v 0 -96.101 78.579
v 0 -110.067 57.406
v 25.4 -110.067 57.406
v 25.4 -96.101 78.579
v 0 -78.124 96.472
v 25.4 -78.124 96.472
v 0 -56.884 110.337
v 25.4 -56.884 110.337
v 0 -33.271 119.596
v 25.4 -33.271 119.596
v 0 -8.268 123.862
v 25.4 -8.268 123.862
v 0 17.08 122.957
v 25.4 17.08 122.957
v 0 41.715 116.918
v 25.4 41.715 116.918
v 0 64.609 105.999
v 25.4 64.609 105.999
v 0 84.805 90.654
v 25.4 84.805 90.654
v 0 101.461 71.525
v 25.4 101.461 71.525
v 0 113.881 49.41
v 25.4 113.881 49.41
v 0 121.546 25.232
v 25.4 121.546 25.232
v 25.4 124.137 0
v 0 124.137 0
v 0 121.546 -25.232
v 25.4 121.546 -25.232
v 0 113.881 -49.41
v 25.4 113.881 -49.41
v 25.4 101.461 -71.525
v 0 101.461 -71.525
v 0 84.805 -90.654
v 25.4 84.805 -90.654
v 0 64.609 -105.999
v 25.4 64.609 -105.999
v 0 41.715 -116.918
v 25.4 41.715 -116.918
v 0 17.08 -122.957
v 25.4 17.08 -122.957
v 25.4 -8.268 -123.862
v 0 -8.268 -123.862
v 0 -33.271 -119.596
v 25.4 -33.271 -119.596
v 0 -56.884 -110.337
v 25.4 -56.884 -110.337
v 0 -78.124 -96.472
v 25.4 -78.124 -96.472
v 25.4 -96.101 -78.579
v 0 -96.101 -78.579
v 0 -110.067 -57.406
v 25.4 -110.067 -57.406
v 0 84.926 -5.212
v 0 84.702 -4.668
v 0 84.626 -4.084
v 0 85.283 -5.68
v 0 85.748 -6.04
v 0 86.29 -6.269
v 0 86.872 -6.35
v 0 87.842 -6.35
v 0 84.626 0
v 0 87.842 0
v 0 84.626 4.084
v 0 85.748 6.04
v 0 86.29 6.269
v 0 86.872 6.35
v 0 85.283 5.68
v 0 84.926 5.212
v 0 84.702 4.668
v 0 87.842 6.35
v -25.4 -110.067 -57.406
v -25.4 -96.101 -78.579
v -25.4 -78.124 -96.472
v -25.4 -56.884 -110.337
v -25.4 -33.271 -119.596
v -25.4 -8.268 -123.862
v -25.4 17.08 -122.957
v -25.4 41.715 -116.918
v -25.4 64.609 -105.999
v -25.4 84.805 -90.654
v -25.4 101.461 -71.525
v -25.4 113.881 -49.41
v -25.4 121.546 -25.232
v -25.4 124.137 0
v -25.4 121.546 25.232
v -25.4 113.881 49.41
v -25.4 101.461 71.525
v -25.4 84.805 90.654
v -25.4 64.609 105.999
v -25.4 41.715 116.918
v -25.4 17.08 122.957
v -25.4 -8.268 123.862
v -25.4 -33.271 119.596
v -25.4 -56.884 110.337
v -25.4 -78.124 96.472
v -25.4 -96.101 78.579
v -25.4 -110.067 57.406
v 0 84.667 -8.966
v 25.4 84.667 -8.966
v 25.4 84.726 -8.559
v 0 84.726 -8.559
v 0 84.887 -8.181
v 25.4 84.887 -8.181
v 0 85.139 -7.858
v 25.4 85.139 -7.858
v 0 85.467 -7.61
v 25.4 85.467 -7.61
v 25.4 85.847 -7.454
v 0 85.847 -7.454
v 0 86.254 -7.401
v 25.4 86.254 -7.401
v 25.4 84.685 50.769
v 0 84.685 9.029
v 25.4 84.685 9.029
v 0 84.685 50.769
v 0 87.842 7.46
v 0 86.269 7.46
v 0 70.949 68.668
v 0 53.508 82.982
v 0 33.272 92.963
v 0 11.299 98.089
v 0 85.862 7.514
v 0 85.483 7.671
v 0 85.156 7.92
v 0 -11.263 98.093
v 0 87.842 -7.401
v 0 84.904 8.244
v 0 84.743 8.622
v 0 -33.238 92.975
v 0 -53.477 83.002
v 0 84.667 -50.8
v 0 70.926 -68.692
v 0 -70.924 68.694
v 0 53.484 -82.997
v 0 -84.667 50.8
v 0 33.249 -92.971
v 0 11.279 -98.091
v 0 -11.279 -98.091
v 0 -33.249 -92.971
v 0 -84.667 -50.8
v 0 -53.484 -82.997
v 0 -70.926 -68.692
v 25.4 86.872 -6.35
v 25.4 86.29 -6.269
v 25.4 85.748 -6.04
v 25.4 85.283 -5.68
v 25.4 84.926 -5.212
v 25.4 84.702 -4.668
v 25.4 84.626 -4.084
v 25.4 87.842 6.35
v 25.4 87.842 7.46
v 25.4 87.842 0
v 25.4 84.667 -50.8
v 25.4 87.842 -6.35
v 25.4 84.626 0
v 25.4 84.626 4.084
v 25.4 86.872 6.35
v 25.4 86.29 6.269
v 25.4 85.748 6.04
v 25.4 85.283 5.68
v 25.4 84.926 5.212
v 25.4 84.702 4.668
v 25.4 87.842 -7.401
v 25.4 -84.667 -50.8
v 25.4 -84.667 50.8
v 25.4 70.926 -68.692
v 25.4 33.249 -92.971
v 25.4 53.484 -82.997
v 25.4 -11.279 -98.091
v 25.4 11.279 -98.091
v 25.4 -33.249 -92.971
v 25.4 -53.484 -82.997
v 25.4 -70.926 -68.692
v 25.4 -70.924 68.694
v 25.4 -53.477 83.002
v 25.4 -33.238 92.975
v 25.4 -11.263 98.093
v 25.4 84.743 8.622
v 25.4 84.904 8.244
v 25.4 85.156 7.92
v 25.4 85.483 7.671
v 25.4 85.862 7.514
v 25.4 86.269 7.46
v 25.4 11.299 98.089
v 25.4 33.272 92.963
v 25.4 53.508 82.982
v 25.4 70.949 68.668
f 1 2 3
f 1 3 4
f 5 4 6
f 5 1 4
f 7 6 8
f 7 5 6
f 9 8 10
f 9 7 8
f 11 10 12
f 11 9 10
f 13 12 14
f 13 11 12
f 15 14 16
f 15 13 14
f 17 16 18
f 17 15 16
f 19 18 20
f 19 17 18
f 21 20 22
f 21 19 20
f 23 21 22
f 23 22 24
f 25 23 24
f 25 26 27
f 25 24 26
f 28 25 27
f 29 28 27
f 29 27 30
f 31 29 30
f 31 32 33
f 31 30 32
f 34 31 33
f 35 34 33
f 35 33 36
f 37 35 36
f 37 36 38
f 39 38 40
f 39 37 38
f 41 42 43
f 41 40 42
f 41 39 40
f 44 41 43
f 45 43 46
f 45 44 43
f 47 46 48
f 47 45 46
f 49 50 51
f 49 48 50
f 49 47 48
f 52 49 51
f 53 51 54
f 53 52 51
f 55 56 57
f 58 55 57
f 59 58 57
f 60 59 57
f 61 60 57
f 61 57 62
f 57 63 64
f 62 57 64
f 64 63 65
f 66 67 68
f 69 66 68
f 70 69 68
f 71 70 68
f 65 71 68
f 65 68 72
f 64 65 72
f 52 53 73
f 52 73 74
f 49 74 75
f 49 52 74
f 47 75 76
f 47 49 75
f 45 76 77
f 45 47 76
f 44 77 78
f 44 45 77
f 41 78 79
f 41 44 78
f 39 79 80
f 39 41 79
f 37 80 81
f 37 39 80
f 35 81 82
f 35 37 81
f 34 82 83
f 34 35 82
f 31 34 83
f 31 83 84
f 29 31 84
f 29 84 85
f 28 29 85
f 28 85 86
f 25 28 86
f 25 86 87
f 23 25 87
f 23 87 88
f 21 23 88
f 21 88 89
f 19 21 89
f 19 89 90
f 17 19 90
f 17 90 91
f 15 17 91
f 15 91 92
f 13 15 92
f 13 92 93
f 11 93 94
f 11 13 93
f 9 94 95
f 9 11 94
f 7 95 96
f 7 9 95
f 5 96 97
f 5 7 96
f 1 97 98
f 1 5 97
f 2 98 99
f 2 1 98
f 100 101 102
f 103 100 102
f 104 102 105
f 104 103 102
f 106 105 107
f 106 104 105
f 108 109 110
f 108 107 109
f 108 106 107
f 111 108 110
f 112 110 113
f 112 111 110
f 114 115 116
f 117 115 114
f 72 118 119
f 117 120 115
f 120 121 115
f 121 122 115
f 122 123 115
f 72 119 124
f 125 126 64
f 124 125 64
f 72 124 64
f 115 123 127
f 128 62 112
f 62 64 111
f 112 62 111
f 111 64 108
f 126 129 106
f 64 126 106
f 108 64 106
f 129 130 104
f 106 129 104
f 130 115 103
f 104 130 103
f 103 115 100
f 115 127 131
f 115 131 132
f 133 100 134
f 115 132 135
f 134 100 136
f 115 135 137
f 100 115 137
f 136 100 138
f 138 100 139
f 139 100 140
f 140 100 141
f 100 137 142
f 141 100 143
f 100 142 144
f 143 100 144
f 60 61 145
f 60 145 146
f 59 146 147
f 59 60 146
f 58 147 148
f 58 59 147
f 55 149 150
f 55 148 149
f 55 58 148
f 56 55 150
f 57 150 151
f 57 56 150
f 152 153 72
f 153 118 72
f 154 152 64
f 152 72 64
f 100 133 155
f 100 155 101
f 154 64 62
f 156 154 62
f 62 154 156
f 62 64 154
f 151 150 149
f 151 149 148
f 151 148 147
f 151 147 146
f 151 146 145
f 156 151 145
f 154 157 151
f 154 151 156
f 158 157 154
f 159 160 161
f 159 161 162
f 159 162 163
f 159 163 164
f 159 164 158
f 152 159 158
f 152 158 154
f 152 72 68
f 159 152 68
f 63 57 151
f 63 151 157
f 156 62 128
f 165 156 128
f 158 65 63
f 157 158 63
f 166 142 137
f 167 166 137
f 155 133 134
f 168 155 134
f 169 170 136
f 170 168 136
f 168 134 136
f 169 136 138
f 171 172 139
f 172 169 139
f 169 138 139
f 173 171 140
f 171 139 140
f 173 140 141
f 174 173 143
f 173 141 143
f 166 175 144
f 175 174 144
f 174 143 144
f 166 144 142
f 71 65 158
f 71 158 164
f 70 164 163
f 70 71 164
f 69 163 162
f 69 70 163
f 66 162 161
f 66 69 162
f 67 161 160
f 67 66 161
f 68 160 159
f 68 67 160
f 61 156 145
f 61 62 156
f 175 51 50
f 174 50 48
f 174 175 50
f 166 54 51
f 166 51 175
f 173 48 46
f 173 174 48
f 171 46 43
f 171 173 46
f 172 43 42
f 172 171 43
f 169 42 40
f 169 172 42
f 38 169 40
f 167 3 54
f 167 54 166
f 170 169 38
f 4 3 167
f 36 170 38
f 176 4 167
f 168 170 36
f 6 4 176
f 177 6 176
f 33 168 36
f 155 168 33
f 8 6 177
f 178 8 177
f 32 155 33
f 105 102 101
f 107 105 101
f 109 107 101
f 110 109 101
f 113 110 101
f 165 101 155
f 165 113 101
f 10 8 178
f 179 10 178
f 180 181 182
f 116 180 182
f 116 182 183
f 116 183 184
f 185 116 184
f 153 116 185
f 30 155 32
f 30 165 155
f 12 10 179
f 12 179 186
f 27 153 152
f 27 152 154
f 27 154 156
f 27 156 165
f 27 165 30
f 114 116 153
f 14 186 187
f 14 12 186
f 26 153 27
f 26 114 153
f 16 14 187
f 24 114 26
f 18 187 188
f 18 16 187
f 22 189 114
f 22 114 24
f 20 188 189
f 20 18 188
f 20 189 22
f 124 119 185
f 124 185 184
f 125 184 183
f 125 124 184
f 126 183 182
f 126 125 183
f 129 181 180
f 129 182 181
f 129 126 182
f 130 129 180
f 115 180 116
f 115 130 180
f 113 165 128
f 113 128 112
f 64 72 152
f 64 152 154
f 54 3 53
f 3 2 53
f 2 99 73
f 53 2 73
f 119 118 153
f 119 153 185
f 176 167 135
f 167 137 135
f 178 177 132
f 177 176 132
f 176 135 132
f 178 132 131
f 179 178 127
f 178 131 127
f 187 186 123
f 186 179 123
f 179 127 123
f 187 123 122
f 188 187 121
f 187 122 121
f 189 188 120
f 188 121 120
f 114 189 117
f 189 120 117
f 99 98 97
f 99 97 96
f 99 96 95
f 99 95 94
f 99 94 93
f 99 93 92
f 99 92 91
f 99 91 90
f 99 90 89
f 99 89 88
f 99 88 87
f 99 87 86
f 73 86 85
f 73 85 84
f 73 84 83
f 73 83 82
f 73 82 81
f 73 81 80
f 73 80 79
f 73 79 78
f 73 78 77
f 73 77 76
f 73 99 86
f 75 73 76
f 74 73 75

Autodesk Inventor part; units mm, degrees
ref_plane "YZ Plane" through (0, 0, 0) normal (1, 0, 0) x (0, 1, 0)
ref_plane "XZ Plane" through (0, 0, 0) normal (0, 1, 0) x (-1, 0, 0)
ref_plane "XY Plane" through (0, 0, 0) normal (0, 0, 1) x (1, 0, 0)
sketch "Sketch1" plane through (0, 0, 0) normal (1, 0, 0) x (0, 1, 0)
  line L0 (-84.6667, -50.8) -> (-84.6667, 50.8)
  arc A0 (-110.0667, -57.4059) -> (-110.0667, 57.4059) centre (0, 0) ccw
  arc A1 (-84.6667, -50.8) -> (84.6667, -50.8) centre (0, 0) ccw
  arc A2 (84.6853, 50.7689) -> (-84.6667, 50.8) centre (0, 0) ccw
  line L1 (-110.0667, 57.4059) -> (-110.0667, -57.4059)
  line L2 (84.6853, 9.0287) -> (84.6667, -8.9655) construction
  arc A3 (86.254, -7.4006) -> (84.6667, -8.9655) centre (86.254, -8.9881) ccw
  arc A4 (84.6853, 9.0287) -> (86.2694, 7.4605) centre (86.2727, 9.048) ccw
  line L3 (84.6667, 0.0316) -> (87.8417, 0.0283) construction
  line L4 (87.8417, 7.4605) -> (86.2694, 7.4605)
  line L5 (84.6667, -50.8) -> (84.6667, -8.9655)
  line L6 (84.6853, 9.0287) -> (84.6853, 50.7689)
  line L7 (84.6259, -4.0844) -> (84.6259, 0)
  line L8 (85.3112, -5.7079) -> (86.8916, -4.0844) construction
  arc A5 (87.8417, -6.35) -> (84.6259, -3.1747) centre (84.6667, -6.3494) ccw construction
  line L9 (87.8417, -6.35) -> (86.8724, -6.35)
  arc A6 (84.6259, -4.0844) -> (86.8724, -6.35) centre (86.8916, -4.0844) ccw
  line L10 (84.6259, 4.0844) -> (84.6259, 0)
  line L11 (85.3112, 5.7079) -> (86.8916, 4.0844) construction
  line L12 (87.8417, 6.35) -> (86.8724, 6.35)
  arc A7 (84.6259, 3.1747) -> (87.8417, 6.35) centre (84.6667, 6.3494) ccw construction
  arc A8 (86.8724, 6.35) -> (84.6259, 4.0844) centre (86.8916, 4.0844) ccw
  line L13 (84.6259, 0) -> (87.8417, 0) construction
  line L14 (87.8417, 7.4605) -> (87.8417, 6.35)
  line L15 (87.8417, 6.35) -> (87.8417, 0)
  line L16 (87.8417, 0) -> (87.8417, -6.35)
  line L17 (87.8417, -6.35) -> (87.8417, -7.4006)
  line L18 (87.8417, -7.4006) -> (86.254, -7.4006)
  point P0 (87.8079, -3.1429)
  point P1 (87.8079, 3.1429)
  point P2 (86.9731, -7.378)
  dimension "d13" = 101.6
  dimension "d18" = 25.4
  dimension "d25" = 1.5875
  dimension "d32" = 6.35
  dimension "d33" = 3.175
  dimension "d34" = 2.2657
  dimension "d35" = 2.2466
  dimension "d36" = 3.2158
extrude "connection" add sketch "Sketch1" along normal blind 25.4
extrude "light\\" add sketch "Sketch1" along normal up to surface (25.4 mm away) separate body contours L9 A6 L7 L10 A8 L12 L15 L16
sketch "Sketch5" plane through (0, 0, 0) normal (-1, 0, 0) x (0, 0, -1)
  arc A0 (-57.4059, 110.0667) -> (57.4059, 110.0667) centre (0, 0) ccw
  line L0 (-57.4059, 110.0667) -> (57.4059, 110.0667) projected
  line L1 (-57.4059, 110.0667) -> (57.4059, 110.0667)
extrude "end cap" add sketch "Sketch5" along normal blind 25.4 bodies 1
properties part number "end cap"
